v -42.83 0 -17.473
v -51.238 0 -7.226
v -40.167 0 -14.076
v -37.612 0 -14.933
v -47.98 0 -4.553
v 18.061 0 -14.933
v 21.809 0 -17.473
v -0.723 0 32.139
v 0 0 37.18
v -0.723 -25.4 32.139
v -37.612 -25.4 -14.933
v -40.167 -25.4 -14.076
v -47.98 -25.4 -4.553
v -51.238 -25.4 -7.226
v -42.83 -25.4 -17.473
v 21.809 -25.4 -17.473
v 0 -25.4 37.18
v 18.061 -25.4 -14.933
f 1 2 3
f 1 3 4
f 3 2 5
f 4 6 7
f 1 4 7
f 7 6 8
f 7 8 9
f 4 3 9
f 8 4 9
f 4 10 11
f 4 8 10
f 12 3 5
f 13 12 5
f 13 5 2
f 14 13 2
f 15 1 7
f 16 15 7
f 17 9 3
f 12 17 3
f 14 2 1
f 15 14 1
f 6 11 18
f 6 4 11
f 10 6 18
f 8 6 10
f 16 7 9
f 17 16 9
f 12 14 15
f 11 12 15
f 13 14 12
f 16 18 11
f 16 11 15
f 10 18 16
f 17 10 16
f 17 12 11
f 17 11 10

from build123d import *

# Parameters (mm, degrees)
F1_DEPTH = 25.4
F2_T     = -2.54


with BuildPart() as f1:
    # F0 (on Front) → F1 (new body)
    with BuildSketch(Plane.XZ):
        Polygon((21.808967, -17.473448), (0, 37.180346), (-40.166995, -14.075698), (-42.829655, -17.473448), align=None)
        Polygon((-42.829655, -17.473448), (-40.166995, -14.075698), (-47.980445, -4.553055), (-51.23793, -7.225862), align=None)
    extrude(amount=F1_DEPTH)

    # F2
    f2_openings = [f1.faces().sort_by_distance(p)[0] for p in [
        (-8.148417, -25.4, 0.40127),
        (-8.148417, 0, 0.40127),
    ]]
    offset(amount=F2_T, openings=f2_openings)


solid = f1.part
